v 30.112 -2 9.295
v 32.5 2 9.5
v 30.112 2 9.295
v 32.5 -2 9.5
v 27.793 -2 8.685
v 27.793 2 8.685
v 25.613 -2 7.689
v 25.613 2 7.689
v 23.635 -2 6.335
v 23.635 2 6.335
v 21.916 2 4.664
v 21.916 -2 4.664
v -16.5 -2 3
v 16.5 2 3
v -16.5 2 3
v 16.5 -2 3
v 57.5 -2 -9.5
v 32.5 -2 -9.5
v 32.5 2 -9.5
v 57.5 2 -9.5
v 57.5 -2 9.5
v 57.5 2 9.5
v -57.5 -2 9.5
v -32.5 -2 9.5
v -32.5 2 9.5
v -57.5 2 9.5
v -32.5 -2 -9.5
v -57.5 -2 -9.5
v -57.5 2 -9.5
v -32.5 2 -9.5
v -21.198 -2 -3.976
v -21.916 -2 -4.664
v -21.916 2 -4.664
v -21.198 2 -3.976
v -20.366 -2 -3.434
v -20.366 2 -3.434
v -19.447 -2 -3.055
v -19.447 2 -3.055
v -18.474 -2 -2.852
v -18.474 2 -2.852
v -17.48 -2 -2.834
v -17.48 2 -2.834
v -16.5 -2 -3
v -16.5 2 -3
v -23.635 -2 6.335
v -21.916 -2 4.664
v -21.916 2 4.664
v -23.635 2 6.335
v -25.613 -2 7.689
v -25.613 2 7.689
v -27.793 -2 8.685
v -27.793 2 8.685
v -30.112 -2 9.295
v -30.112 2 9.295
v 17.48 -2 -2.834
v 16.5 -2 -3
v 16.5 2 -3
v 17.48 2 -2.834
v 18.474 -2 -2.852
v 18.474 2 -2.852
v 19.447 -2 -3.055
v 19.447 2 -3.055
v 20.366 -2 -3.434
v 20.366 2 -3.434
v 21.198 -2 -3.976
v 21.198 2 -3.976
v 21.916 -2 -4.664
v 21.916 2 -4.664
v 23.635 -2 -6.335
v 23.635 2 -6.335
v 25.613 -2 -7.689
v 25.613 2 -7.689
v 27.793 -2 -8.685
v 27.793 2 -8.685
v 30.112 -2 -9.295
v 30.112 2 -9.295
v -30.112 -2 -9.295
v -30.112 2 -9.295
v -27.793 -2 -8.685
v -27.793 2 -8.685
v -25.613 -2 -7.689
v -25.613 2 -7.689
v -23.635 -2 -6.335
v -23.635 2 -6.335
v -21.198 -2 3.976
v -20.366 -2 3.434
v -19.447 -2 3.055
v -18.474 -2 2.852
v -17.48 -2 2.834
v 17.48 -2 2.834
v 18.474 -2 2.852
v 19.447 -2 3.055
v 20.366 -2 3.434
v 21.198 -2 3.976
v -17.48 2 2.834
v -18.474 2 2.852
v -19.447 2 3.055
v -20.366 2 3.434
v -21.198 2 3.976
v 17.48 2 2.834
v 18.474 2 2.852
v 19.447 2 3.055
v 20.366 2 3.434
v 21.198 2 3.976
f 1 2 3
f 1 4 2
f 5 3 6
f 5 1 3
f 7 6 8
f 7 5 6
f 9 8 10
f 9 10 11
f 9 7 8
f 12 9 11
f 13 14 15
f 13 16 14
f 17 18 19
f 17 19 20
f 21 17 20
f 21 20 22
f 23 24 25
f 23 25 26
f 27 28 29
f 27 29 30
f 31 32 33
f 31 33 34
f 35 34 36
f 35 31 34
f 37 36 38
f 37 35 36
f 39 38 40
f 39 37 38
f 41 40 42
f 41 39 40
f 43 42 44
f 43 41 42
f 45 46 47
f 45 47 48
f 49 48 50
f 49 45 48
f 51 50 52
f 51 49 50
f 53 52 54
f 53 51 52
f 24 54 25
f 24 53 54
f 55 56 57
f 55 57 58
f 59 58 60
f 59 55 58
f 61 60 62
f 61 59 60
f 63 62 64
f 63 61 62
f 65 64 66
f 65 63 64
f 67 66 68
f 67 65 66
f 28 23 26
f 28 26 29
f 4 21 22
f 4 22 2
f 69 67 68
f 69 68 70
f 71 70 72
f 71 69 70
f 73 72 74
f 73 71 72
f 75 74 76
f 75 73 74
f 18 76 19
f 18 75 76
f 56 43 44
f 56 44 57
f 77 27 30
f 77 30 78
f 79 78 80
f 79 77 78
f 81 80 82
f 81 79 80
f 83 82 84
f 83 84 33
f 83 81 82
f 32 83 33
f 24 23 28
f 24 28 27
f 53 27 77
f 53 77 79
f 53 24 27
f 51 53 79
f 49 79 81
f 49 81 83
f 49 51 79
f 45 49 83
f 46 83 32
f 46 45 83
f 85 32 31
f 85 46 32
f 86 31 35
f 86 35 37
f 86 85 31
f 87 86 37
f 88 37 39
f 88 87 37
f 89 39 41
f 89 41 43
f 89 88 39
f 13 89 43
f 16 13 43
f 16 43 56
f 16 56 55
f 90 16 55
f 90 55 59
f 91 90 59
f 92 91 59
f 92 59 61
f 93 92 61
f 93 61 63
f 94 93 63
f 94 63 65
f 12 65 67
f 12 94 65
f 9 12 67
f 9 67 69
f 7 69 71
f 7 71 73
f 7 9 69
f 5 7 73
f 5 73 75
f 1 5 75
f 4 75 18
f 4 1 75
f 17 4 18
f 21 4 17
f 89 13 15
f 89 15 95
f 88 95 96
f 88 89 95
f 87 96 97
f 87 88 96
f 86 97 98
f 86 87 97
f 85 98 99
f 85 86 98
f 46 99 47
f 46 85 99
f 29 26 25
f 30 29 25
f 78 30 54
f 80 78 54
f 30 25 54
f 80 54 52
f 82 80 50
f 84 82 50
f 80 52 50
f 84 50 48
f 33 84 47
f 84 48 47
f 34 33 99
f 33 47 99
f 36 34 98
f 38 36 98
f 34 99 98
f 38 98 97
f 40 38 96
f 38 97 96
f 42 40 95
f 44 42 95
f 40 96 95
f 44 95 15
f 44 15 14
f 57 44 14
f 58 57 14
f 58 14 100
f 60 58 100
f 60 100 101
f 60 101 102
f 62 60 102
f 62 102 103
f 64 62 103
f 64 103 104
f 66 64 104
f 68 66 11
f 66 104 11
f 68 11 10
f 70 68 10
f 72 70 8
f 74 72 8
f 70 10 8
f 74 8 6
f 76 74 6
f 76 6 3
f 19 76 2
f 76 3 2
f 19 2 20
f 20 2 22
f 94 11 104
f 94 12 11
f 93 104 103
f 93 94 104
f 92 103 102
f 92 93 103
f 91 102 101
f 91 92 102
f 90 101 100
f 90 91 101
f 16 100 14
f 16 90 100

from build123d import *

# Parameters (mm, degrees)
F1_DEPTH = 2
F2_DEPTH = 2


with BuildPart() as f1:
    # F0 (on Front) → F1 (new body, symmetric)
    with BuildSketch(Plane.XZ):
        with BuildLine():
            Line((16.5, 3), (0, 3))
            Line((0, 3), (-16.5, 3))
            ThreePointArc((-16.5, 3), (-19.446852, 3.054649), (-21.916025, 4.664031))
            ThreePointArc((-21.916025, 4.664031), (-26.681772, 8.233743), (-32.5, 9.5))
            Line((-32.5, 9.5), (-57.5, 9.5))
            Line((-57.5, 9.5), (-57.5, -9.5))
            Line((-57.5, -9.5), (-32.5, -9.5))
            ThreePointArc((-32.5, -9.5), (-26.681772, -8.233743), (-21.916025, -4.664031))
            ThreePointArc((-21.916025, -4.664031), (-19.446852, -3.054649), (-16.5, -3))
            Line((-16.5, -3), (0, -3))
            Line((0, -3), (16.5, -3))
            ThreePointArc((16.5, -3), (19.446852, -3.054649), (21.916025, -4.664031))
            ThreePointArc((21.916025, -4.664031), (26.681772, -8.233743), (32.5, -9.5))
            Line((32.5, -9.5), (57.5, -9.5))
            Line((57.5, -9.5), (57.5, 9.5))
            Line((57.5, 9.5), (32.5, 9.5))
            ThreePointArc((32.5, 9.5), (26.681772, 8.233743), (21.916025, 4.664031))
            ThreePointArc((21.916025, 4.664031), (19.446852, 3.054649), (16.5, 3))
        make_face()
    extrude(amount=F1_DEPTH, both=True)

    # F0 (on Front) → F2 (join, symmetric)
    with BuildSketch(Plane.XZ):
        with BuildLine():
            Line((16.5, 3), (0, 3))
            Line((0, 3), (-16.5, 3))
            ThreePointArc((-16.5, 3), (-19.446852, 3.054649), (-21.916025, 4.664031))
            ThreePointArc((-21.916025, 4.664031), (-26.681772, 8.233743), (-32.5, 9.5))
            Line((-32.5, 9.5), (-57.5, 9.5))
            Line((-57.5, 9.5), (-57.5, -9.5))
            Line((-57.5, -9.5), (-32.5, -9.5))
            ThreePointArc((-32.5, -9.5), (-26.681772, -8.233743), (-21.916025, -4.664031))
            ThreePointArc((-21.916025, -4.664031), (-19.446852, -3.054649), (-16.5, -3))
            Line((-16.5, -3), (0, -3))
            Line((0, -3), (16.5, -3))
            ThreePointArc((16.5, -3), (19.446852, -3.054649), (21.916025, -4.664031))
            ThreePointArc((21.916025, -4.664031), (26.681772, -8.233743), (32.5, -9.5))
            Line((32.5, -9.5), (57.5, -9.5))
            Line((57.5, -9.5), (57.5, 9.5))
            Line((57.5, 9.5), (32.5, 9.5))
            ThreePointArc((32.5, 9.5), (26.681772, 8.233743), (21.916025, 4.664031))
            ThreePointArc((21.916025, 4.664031), (19.446852, 3.054649), (16.5, 3))
        make_face()
    extrude(amount=F2_DEPTH, both=True)


solid = f1.part
